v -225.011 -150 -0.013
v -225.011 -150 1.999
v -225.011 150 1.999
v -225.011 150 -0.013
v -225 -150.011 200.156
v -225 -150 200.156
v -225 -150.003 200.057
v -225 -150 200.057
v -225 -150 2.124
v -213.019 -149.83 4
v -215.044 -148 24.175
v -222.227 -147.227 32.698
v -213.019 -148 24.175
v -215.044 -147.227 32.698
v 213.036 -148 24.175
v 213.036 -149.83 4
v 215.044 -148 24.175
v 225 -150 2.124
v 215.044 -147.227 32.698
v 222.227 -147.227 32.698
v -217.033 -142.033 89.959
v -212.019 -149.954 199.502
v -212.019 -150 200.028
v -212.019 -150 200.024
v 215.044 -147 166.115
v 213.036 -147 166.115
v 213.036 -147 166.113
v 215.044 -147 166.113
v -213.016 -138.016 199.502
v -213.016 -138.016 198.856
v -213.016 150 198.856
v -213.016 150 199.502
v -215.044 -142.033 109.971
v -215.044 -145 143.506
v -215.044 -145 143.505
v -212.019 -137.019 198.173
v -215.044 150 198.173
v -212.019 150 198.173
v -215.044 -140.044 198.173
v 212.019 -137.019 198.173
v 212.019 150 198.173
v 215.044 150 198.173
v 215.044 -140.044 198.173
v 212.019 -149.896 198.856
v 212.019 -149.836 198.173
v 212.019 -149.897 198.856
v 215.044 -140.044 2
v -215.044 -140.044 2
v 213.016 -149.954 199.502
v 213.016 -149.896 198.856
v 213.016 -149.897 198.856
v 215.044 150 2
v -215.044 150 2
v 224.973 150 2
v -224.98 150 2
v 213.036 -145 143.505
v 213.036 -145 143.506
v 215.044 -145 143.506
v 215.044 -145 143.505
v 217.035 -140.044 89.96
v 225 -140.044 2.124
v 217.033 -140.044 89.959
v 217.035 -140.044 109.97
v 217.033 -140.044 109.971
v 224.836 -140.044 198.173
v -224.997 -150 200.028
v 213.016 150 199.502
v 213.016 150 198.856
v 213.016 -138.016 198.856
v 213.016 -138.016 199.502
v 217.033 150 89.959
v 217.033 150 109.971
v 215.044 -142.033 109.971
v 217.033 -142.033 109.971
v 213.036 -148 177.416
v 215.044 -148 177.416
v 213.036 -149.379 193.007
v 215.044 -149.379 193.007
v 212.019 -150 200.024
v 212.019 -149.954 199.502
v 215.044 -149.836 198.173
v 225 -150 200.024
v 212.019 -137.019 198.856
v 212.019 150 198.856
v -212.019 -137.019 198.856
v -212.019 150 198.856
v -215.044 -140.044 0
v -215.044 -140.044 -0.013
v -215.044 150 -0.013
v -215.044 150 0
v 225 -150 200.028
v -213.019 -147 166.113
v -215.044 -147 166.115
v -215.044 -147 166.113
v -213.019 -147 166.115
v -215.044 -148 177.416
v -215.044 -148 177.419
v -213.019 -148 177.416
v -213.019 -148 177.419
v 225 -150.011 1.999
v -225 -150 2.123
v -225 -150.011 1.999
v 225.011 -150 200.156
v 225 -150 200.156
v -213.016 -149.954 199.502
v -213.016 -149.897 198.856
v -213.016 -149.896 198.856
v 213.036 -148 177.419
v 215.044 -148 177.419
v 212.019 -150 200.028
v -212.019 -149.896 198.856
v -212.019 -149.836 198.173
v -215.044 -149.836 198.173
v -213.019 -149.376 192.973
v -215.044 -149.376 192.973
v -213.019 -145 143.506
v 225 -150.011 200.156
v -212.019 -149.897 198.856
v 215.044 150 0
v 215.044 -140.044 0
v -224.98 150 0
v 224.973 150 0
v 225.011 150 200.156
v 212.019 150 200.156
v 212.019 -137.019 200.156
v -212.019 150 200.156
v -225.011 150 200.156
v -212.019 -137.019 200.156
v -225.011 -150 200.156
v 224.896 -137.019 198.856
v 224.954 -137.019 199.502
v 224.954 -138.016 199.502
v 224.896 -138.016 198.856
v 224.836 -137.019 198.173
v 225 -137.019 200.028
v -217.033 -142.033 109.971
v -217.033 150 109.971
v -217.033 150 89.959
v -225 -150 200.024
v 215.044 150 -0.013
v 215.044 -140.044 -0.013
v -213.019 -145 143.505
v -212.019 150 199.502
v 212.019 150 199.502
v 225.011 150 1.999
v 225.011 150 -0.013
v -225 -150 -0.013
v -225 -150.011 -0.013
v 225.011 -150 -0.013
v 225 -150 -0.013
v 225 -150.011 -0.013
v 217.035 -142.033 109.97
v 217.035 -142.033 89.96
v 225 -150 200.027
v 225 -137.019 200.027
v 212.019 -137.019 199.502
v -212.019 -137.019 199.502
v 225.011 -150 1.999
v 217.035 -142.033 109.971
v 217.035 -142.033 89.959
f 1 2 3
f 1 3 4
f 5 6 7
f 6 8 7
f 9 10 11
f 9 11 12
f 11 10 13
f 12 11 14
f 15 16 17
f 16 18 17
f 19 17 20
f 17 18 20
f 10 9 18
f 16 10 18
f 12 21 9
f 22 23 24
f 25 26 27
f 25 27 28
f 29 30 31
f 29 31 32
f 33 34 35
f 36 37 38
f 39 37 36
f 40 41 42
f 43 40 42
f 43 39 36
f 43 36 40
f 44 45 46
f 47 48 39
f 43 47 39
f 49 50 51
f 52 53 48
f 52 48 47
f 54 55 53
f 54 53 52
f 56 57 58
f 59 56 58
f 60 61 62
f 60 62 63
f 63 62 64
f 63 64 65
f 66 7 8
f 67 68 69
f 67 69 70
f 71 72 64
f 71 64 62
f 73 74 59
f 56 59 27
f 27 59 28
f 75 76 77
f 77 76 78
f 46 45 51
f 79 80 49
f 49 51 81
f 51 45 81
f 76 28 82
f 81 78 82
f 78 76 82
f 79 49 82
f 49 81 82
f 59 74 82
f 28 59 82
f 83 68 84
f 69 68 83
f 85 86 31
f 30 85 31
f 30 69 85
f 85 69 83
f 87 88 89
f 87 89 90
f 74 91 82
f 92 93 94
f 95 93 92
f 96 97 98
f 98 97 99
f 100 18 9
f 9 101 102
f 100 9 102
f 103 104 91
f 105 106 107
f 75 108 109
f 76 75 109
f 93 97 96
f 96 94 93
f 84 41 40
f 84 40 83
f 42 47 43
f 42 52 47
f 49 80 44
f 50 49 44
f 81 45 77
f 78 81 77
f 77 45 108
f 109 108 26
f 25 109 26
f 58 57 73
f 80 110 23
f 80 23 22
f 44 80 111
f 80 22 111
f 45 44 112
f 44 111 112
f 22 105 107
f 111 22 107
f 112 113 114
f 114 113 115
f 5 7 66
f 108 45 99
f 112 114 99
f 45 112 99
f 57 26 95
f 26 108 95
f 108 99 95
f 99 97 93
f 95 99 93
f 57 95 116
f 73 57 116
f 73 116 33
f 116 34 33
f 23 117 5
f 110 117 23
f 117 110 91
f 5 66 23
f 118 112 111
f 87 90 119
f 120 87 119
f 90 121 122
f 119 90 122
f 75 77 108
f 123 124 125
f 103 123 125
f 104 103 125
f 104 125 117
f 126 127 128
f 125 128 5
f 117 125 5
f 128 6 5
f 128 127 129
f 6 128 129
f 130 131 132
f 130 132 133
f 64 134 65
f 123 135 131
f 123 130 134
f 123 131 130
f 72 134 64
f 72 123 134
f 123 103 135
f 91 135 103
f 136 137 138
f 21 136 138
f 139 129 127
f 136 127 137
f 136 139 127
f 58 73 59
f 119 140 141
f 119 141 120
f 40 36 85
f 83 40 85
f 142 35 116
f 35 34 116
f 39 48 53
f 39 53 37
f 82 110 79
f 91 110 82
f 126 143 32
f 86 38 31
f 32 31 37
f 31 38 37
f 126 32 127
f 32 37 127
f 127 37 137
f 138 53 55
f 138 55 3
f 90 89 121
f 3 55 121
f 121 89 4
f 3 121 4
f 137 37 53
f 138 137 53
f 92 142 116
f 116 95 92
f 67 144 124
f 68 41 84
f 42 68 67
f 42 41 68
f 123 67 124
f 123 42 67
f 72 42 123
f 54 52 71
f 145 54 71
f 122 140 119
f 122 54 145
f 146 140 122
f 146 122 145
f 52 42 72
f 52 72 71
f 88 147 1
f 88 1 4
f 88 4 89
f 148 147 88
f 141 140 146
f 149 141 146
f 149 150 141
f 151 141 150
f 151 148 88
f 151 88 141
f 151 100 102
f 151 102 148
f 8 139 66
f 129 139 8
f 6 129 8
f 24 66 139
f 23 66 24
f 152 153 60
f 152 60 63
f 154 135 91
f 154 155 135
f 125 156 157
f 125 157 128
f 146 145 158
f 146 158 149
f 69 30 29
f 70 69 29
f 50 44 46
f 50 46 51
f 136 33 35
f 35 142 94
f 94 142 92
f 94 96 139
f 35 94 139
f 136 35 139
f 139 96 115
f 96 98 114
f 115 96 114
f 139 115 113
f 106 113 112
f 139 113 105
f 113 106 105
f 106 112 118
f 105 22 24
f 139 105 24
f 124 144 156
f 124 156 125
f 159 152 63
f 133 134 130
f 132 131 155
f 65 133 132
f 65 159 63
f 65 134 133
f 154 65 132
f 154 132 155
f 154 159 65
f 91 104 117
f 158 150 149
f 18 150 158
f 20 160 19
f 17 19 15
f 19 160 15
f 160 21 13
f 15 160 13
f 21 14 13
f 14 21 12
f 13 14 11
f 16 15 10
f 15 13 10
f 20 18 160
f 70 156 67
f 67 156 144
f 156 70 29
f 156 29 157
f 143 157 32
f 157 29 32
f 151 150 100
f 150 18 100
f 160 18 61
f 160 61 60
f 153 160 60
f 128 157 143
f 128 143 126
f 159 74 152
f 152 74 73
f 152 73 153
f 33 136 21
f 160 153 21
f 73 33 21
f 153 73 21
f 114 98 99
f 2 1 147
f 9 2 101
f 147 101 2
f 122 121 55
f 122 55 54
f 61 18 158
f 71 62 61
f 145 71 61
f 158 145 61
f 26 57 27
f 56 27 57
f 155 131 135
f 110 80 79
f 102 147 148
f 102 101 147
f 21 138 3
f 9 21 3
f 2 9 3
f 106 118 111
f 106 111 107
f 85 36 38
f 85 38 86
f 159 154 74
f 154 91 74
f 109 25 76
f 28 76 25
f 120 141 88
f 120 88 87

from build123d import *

# Parameters (mm, degrees)
EXTRUDE001_DEPTH               = 300
EXTRUDE002_DEPTH               = 300
EXTRUDE002_PLACEMENT_ANGLE     = 180
EXTRUDE004_DEPTH               = 2
EXTRUDE003_DEPTH               = 2
SKETCH_W                       = 449.952683
SKETCH_H                       = 299.978927
EXTRUDE_DEPTH                  = 2
FUSION_PLACEMENT_ANGLE         = 180
BASEFEATURE001_PLACEMENT_ANGLE = 180
POCKET001_DEPTH                = 825.012353
EXTRUDE005_DEPTH               = 450
POCKET_DEPTH                   = 250
POCKET002_DEPTH                = 500


with BuildPart() as right:
    # Wire → Extrude001 (new body)
    with BuildSketch(Plane(origin=(218.5150455, 150, 100.0712645), x_dir=(1, 0, 0), z_dir=(0, 1, 0))):
        Polygon((6.4963075, 100.0846805), (-3.4711005, 100.0846805), (-3.4711005, -98.1016935), (-6.4963075, -98.1016935), (-6.4963075, -98.7846775), (-5.4995125, -98.7846775), (-5.4995125, -99.4307345), (-6.4963075, -99.4307345), (-6.4963075, -100.0846805), (6.4963075, -100.0846805), (-1.4816445, -9.9001025), (-1.4816445, 10.1120285), (6.4963075, 98.0725005), align=None)
    extrude(amount=-EXTRUDE001_DEPTH)


with BuildPart() as left:
    # Wire001 → Extrude002 (new body)
    with BuildSketch(Plane(origin=(218.5150455, 150, 100.0712645), x_dir=(1, 0, 0), z_dir=(0, 1, 0))):
        Polygon((6.4963075, 100.0846805), (-3.4711005, 100.0846805), (-3.4711005, -98.1016935), (-6.4963075, -98.1016935), (-6.4963075, -98.7846775), (-5.4995125, -98.7846775), (-5.4995125, -99.4307345), (-6.4963075, -99.4307345), (-6.4963075, -100.0846805), (6.4963075, -100.0846805), (-1.4816445, -9.9001025), (-1.4816445, 10.1120285), (6.4963075, 98.0725005), align=None)
    extrude(amount=-EXTRUDE002_DEPTH)


with BuildPart() as left_1:
    # Extrude002 placement: moved
    add(left.part.rotate(Axis((0, 0, 0), (0, 0, 1)), EXTRUDE002_PLACEMENT_ANGLE))


with BuildPart() as inner_back_holder:
    # Sketch002 → Extrude004 (new body)
    with BuildSketch(Plane.XZ.offset(150)):
        Polygon((-213.019012, 3.99983), (-213.019012, 192.972672), (-216.785446, 192.972672), (-216.785446, 0.188954), (216.195801, 0.188954), (216.195801, 193.007004), (213.035522, 193.006973), (213.035522, 3.99983), align=None)
    extrude(amount=-EXTRUDE004_DEPTH)


with BuildPart() as inner_back_holder_1:
    # Extrude004 placement: moved
    add(inner_back_holder.part.moved(Location((0, 3, 0))))


with BuildPart() as outer_back_holder:
    # Sketch001 → Extrude003 (new body)
    with BuildSketch(Plane.XZ.offset(150)):
        Polygon((-213.019012, 3.99983), (-213.019012, 192.972672), (-216.785446, 192.972672), (-216.785446, 0.188954), (216.195801, 0.188954), (216.195801, 193.007004), (213.035522, 193.006973), (213.035522, 3.99983), align=None)
    extrude(amount=-EXTRUDE003_DEPTH)


with BuildPart() as main_body:
    # Sketch → Extrude (new body)
    with BuildSketch(Plane.XY):
        with Locations((-0.0037765, 0.0109025)):
            Rectangle(SKETCH_W, SKETCH_H)
    extrude(amount=EXTRUDE_DEPTH)

    # Fusion: union Right, Left, Inner-Back-Holder, Outer-Back-Holder
    add(right.part)
    add(left_1.part)
    add(inner_back_holder_1.part)
    add(outer_back_holder.part)


with BuildPart() as main_body_1:
    # Fusion placement: moved
    add(main_body.part.rotate(Axis((0, 0, 0), (0, 0, 1)), FUSION_PLACEMENT_ANGLE))


with BuildPart() as main_body_2:
    # BaseFeature001 placement: moved
    add(main_body_1.part.rotate(Axis((0, 0, 0), (0, 0, -1)), BASEFEATURE001_PLACEMENT_ANGLE))

    # Sketch004 → Pocket001 (cut, through all)
    with BuildSketch(Plane.YZ.offset(600)):
        Polygon((-150.000214, 200.026337), (-150.207199, 200.026337), (-150.207199, 2.124103), (-150, 2.124103), (-142.033401, 89.958923), (-142.033401, 109.971352), align=None)
    extrude(amount=-POCKET001_DEPTH, mode=Mode.SUBTRACT)


with BuildPart() as main_body001:
    # Wire002 → Extrude005 (new body)
    with BuildSketch(Plane(origin=(150, -218.5150455, 100.0712645), x_dir=(0, -1, 0), z_dir=(1, 0, 0))):
        Polygon((6.4963075, 100.0846805), (-3.4711005, 100.0846805), (-3.4711005, -98.1016935), (-6.4963075, -98.1016935), (-6.4963075, -98.7846775), (-5.4995125, -98.7846775), (-5.4995125, -99.4307345), (-6.4963075, -99.4307345), (-6.4963075, -100.0846805), (6.4963075, -100.0846805), (-1.4816445, -9.9001025), (-1.4816445, 10.1120285), (6.4963075, 98.0725005), align=None)
    extrude(amount=EXTRUDE005_DEPTH)


with BuildPart() as main_body001_1:
    # Extrude005 placement: moved
    add(main_body001.part.moved(Location((-375, 75, 0))))


with BuildPart() as main_body001_2:
    # BaseFeature placement: moved
    add(main_body001_1.part.moved(Location((375, -75, 0))))

    # Sketch003 → Pocket (cut, symmetric)
    with BuildSketch(Plane(origin=(375, 0, 0), x_dir=(1, 0, 0), z_dir=(0, -1, 0))):
        Polygon((-224.999924, 200.057419), (-217.03331, 109.971413), (-217.03331, 89.959267), (-224.999924, 2.122504), (-227.360413, 2.122504), (-227.360413, 200.057419), align=None)
    extrude(amount=POCKET_DEPTH, both=True, mode=Mode.SUBTRACT)

    # Sketch005 → Pocket002 (cut)
    with BuildSketch(Plane(origin=(375, -300, 0), x_dir=(1, 0, 0), z_dir=(0, -1, 0))):
        Polygon((225.000046, 200.027863), (225.188705, 200.027863), (225.188705, 2.123739), (225.000061, 2.123739), (217.034546, 89.959541), (217.034546, 109.969955), align=None)
    extrude(amount=-POCKET002_DEPTH, mode=Mode.SUBTRACT)


with BuildPart() as main_body001_3:
    # Body placement: moved
    add(main_body001_2.part.moved(Location((-375, 75, 0))))

    # Fusion001: union  Main Body
    add(main_body_2.part)


solid = main_body001_3.part
